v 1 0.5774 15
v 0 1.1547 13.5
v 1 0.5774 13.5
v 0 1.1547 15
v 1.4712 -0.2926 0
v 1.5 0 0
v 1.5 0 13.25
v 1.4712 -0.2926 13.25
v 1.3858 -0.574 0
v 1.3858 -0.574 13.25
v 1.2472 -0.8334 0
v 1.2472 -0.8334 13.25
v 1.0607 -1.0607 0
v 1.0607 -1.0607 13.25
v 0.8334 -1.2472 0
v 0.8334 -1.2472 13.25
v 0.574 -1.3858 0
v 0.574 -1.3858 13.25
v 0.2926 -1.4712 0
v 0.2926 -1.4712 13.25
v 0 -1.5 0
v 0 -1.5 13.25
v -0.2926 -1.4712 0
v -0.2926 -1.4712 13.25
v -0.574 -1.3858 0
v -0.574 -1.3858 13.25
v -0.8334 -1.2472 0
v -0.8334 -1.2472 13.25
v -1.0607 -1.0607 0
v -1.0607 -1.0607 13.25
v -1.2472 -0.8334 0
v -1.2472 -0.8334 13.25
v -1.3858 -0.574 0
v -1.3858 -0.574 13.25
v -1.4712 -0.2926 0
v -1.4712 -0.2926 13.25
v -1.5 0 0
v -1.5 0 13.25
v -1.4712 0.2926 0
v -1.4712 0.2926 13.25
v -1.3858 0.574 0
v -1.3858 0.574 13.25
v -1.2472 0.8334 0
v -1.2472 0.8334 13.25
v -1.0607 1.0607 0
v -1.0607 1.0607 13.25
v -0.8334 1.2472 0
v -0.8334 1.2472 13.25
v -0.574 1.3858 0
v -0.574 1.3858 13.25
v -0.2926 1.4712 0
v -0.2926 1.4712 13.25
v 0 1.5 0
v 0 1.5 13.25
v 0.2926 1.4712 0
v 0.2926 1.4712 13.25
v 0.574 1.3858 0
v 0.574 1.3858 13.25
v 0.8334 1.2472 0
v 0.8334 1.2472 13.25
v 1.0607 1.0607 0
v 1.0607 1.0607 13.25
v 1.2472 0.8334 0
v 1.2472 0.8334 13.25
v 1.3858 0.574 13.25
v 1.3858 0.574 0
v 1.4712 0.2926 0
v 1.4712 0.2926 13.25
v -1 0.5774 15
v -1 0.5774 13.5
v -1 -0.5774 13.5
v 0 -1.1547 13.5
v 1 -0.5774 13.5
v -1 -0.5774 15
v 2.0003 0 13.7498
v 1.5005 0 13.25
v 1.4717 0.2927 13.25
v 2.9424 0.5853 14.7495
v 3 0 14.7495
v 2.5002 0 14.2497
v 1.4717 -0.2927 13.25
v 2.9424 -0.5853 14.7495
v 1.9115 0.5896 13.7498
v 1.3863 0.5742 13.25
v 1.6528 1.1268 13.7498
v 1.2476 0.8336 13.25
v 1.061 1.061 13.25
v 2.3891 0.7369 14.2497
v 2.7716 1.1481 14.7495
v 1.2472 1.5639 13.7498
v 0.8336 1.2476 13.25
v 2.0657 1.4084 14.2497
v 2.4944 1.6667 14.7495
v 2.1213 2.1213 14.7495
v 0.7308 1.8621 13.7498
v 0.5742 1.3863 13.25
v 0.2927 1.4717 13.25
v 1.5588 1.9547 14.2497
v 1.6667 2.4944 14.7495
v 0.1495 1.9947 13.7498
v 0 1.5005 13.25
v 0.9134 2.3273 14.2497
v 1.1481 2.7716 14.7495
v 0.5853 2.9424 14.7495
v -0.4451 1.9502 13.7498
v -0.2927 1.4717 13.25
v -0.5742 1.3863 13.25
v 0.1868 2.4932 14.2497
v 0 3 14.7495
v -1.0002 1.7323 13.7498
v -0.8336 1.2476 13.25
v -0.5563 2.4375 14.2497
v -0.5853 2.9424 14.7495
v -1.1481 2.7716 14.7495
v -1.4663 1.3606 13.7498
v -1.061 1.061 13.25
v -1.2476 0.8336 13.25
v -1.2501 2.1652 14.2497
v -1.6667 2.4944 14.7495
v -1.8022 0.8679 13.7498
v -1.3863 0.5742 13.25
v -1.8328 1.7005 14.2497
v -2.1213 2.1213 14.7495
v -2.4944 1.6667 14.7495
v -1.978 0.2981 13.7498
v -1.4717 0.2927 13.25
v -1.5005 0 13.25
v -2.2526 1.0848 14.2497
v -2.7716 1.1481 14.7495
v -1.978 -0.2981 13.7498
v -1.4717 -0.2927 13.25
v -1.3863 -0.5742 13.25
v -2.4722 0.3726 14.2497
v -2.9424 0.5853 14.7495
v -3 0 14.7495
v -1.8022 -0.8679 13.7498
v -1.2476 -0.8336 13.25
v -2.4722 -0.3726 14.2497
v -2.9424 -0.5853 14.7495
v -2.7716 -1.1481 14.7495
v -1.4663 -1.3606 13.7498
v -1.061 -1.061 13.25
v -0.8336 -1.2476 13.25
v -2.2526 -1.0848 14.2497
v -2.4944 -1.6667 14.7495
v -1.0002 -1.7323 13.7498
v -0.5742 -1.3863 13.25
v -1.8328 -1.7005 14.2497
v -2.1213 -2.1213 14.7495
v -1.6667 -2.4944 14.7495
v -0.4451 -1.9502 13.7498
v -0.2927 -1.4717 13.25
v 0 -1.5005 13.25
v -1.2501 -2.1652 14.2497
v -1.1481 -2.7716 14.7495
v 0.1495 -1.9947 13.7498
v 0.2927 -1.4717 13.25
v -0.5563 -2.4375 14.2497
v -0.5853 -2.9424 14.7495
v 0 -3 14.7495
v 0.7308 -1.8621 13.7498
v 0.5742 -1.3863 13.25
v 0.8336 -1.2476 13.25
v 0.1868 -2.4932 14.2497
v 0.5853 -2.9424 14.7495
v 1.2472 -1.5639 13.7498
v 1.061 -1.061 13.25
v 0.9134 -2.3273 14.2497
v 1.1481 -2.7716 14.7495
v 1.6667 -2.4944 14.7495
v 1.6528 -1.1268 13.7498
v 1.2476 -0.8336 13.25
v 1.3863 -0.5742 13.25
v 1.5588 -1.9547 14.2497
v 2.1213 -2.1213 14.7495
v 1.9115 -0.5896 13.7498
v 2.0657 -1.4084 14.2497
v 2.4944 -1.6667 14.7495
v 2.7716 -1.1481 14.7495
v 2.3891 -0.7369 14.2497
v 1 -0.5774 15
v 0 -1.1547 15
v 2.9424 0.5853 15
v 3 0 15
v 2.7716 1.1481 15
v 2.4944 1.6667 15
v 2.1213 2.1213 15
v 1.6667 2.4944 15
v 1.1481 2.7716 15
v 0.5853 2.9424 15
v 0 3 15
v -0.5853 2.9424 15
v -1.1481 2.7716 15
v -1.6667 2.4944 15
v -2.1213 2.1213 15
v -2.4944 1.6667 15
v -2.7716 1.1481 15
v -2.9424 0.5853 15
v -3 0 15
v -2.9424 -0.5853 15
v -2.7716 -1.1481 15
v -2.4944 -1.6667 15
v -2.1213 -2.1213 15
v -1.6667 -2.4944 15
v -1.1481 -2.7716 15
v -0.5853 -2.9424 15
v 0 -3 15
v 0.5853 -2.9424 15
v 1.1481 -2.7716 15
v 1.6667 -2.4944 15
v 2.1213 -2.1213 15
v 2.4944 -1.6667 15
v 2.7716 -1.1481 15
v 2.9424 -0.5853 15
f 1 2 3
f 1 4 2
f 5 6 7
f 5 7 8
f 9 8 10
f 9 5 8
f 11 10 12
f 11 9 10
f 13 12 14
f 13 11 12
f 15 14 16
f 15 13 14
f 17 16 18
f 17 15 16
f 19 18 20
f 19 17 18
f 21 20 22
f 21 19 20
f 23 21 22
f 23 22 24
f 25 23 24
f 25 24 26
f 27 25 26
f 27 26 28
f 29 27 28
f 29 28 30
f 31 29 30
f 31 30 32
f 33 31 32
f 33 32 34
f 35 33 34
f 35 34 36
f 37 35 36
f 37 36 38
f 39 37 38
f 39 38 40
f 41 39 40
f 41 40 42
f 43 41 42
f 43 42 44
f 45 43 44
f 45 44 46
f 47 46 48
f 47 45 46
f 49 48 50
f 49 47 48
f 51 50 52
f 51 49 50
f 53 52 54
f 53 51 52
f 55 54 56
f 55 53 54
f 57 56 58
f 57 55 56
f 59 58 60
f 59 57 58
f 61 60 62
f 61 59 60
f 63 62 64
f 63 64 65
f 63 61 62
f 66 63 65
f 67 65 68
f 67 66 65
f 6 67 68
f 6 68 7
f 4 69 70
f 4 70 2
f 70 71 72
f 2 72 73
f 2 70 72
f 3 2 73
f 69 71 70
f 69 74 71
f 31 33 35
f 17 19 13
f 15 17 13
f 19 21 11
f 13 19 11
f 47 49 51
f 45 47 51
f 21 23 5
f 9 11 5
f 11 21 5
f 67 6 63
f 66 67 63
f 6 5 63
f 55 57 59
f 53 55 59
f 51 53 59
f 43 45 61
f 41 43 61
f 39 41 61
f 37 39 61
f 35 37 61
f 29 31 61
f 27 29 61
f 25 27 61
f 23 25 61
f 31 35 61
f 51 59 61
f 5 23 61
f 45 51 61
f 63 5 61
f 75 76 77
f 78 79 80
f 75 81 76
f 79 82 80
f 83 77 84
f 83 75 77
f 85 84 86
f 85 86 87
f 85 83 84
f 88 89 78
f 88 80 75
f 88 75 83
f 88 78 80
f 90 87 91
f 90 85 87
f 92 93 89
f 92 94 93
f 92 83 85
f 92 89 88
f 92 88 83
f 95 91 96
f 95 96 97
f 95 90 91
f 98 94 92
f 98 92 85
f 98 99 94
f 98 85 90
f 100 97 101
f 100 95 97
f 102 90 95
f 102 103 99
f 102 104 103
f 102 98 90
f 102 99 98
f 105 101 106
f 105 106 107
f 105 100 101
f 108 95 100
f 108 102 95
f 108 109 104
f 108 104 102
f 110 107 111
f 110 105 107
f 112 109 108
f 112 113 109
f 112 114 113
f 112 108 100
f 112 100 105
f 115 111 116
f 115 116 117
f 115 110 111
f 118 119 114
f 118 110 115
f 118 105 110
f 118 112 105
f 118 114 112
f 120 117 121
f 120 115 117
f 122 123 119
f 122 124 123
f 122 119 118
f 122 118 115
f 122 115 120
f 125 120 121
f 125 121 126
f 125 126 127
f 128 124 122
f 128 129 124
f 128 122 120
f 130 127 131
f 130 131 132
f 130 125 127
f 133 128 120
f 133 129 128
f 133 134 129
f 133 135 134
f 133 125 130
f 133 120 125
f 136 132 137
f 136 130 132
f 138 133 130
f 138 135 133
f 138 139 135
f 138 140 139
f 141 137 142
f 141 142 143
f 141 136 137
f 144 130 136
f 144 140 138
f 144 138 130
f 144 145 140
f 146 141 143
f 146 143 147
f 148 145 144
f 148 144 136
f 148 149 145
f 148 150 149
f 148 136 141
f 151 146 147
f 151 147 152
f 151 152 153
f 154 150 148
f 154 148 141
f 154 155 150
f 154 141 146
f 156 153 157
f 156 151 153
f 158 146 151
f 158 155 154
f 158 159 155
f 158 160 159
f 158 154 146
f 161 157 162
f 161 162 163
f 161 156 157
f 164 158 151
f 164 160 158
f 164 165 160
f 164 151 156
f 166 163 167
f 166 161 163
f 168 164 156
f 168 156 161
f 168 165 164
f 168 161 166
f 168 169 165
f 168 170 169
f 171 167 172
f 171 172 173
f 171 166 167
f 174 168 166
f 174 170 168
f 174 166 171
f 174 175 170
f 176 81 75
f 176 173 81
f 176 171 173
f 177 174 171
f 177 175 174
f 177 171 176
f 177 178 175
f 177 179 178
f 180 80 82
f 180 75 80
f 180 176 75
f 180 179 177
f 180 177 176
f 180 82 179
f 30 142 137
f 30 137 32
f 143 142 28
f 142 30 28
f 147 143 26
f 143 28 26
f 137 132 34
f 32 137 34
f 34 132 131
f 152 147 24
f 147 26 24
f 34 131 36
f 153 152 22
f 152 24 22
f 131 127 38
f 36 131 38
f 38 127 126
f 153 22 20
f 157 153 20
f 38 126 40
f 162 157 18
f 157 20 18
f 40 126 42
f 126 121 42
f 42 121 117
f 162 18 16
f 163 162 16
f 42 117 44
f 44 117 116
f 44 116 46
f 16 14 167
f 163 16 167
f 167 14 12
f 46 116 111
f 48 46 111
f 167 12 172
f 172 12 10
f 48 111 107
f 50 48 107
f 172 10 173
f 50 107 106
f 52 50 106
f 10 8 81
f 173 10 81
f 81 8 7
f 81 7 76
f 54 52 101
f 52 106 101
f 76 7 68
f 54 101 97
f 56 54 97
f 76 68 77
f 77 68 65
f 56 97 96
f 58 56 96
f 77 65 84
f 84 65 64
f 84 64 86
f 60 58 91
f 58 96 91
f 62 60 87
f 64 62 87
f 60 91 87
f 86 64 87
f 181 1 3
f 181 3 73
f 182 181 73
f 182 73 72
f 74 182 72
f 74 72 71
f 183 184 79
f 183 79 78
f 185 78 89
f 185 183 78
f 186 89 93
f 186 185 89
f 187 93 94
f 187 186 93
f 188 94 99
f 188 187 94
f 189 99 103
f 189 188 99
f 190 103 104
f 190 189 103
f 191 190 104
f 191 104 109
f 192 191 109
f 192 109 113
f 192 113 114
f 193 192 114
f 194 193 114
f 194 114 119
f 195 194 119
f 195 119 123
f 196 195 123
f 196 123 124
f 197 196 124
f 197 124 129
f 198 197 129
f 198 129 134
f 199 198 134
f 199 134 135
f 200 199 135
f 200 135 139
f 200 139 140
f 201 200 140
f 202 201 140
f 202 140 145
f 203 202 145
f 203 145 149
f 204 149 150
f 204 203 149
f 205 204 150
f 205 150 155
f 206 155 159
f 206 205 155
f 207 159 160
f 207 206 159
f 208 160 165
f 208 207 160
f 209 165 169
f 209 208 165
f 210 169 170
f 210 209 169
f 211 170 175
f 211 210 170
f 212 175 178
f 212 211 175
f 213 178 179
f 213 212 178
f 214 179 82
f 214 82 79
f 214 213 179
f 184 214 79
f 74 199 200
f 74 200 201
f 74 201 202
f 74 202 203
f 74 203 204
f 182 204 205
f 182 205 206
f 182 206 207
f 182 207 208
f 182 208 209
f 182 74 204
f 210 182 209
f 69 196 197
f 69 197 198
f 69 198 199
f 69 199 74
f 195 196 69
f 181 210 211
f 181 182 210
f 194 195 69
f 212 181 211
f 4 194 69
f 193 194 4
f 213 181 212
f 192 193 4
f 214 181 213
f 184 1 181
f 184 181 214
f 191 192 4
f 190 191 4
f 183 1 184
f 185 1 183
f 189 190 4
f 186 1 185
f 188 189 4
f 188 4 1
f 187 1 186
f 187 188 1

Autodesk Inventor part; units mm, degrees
ref_plane "YZ Plane" through (0, 0, 0) normal (1, 0, 0) x (0, 1, 0)
ref_plane "XZ Plane" through (0, 0, 0) normal (0, 1, 0) x (-1, 0, 0)
ref_plane "XY Plane" through (0, 0, 0) normal (0, 0, 1) x (1, 0, 0)
sketch "スケッチ1" plane through (0, 0, 0) normal (0, 0, 1) x (1, 0, 0)
  circle A0 centre (0, 0) radius 1.5
  dimension "d0" = 3
extrude "押し出し1" add sketch "スケッチ1" along normal blind 15
thread "ねじ1" size "M3x0.5" class "6g" standard "ANSI Metric M Profile" full length
sketch "スケッチ2" plane through (0, 0, 15) normal (0, 0, 1) x (1, 0, 0)
  circle A0 centre (0, 0) radius 3
  dimension "d5" = 6
extrude "押し出し2" add sketch "スケッチ2" against normal blind 1.75
chamfer "面取り1" distance 1.5 angle 45 1 edges at (-3, 0, 13.25)
sketch "スケッチ3" plane through (0, 0, 15) normal (0, 0, 1) x (1, 0, 0)
  line L0 (0, 1.1547) -> (1, 0.5774)
  line L1 (1, 0.5774) -> (1, -0.5774)
  line L2 (1, -0.5774) -> (0, -1.1547)
  line L3 (0, -1.1547) -> (-1, -0.5774)
  line L4 (-1, -0.5774) -> (-1, 0.5774)
  line L5 (-1, 0.5774) -> (0, 1.1547)
  point P0 (0, 0)
  point P1 (0, 0)
  dimension "d11" = 2
extrude "押し出し3" cut sketch "スケッチ3" against normal blind 1.5
properties part number "m3皿ネジ15" material "鉄 灰色"
